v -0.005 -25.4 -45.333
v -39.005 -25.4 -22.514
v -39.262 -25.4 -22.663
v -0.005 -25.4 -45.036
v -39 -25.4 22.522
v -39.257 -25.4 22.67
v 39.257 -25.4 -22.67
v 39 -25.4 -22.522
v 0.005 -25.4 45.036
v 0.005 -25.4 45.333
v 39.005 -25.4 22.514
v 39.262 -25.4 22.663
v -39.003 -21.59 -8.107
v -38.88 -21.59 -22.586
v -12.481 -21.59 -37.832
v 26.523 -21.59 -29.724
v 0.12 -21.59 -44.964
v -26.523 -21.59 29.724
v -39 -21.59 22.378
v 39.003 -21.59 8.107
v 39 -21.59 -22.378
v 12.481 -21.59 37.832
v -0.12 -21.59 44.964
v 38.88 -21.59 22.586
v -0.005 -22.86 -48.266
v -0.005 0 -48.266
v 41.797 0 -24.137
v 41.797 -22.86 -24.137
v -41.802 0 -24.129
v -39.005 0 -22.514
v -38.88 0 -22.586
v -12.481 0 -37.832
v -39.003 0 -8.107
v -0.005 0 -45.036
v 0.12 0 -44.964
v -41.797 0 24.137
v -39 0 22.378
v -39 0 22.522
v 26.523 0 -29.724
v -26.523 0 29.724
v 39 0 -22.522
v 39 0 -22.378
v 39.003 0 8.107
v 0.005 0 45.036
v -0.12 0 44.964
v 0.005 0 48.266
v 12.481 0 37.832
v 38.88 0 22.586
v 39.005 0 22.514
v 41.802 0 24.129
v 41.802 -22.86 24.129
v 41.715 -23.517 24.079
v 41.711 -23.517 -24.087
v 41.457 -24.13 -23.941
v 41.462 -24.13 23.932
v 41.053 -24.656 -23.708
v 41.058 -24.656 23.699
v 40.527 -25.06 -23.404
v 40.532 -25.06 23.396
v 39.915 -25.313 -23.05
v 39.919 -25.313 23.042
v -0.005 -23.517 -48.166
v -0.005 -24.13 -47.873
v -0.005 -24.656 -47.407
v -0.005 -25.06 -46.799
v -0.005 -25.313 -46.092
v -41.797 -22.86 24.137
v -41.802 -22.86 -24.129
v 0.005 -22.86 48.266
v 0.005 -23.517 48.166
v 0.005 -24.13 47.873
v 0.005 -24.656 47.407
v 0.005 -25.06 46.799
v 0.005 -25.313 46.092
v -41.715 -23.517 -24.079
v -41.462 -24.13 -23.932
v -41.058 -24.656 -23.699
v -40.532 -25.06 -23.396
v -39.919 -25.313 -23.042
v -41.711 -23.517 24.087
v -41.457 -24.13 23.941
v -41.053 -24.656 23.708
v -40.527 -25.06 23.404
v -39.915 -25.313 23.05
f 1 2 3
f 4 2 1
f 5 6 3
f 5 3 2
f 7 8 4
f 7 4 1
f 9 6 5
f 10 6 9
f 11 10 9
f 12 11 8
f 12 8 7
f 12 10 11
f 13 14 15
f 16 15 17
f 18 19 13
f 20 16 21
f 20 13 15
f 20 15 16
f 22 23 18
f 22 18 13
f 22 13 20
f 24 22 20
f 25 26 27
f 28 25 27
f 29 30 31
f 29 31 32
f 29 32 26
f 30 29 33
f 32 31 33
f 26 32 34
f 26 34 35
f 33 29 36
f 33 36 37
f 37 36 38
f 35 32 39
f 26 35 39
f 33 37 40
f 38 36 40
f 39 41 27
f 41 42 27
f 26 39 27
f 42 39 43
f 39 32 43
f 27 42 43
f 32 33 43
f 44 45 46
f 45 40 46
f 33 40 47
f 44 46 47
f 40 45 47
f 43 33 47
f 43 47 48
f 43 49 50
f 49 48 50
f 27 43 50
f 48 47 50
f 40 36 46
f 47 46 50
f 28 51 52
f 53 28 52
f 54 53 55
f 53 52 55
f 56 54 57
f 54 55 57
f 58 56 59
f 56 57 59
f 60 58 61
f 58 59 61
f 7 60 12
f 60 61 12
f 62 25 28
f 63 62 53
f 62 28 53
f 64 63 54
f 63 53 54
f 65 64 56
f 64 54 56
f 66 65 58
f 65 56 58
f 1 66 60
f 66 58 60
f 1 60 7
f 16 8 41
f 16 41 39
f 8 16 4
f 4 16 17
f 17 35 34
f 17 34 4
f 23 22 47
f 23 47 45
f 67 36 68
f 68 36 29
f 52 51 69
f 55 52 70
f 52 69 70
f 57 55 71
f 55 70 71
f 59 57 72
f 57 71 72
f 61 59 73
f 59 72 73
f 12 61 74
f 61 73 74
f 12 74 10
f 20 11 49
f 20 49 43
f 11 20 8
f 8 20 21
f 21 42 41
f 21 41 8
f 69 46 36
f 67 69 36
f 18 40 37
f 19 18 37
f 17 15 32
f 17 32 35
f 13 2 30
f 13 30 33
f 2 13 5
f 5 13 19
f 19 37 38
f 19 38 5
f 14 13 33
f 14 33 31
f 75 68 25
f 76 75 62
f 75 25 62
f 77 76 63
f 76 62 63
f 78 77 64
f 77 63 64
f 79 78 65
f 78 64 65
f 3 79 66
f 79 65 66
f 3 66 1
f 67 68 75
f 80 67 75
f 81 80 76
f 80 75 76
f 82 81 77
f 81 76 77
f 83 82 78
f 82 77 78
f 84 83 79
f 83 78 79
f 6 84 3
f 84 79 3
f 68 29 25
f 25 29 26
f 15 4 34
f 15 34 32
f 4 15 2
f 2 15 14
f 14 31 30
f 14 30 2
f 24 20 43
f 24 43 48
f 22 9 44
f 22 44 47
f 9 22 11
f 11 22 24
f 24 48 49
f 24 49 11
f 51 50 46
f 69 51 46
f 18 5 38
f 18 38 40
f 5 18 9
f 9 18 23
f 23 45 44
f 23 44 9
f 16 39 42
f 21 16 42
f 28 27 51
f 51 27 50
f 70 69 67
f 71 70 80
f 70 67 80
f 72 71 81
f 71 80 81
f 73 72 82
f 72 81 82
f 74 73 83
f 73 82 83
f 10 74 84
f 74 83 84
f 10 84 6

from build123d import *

# Parameters (mm, degrees)
F1_DEPTH = 25.4
F3_DEPTH = 21.59
F4_R     = 2.54


with BuildPart() as f1:
    # F0 (on Front) → F1 (new body)
    with BuildSketch(Plane.XZ):
        Polygon((0.004891, 48.265907), (-41.797056, 24.137189), (-41.801947, -24.128718), (-0.004891, -48.265907), (41.797056, -24.137189), (41.801947, 24.128718), align=None)
        Polygon((-39.000372, 22.522145), (0.004563, 45.036386), (39.004936, 22.514241), (39.000372, -22.522145), (-0.004563, -45.036386), (-39.004936, -22.514241), align=None, mode=Mode.SUBTRACT)
    extrude(amount=F1_DEPTH)

    # F2 (on Front) → F3 (join)
    with BuildSketch(Plane.XZ):
        Polygon((38.877433, 22.890052), (-0.38465, 45.113871), (-39.262083, 22.223819), (-38.877433, -22.890052), (0.38465, -45.113871), (39.262083, -22.223819), align=None)
    extrude(amount=F3_DEPTH)

    # F4
    f4_edges = [f1.edges().sort_by_distance(p)[0] for p in [
        (-20.903419, -25.4, -36.197312),
        (-41.799501, -25.4, 0.004235),
        (-20.896083, -25.4, 36.201548),
        (20.896083, -25.4, -36.201548),
        (41.799501, -25.4, -0.004235),
        (20.903419, -25.4, 36.197312),
    ]]
    fillet(f4_edges, radius=F4_R)


solid = f1.part
